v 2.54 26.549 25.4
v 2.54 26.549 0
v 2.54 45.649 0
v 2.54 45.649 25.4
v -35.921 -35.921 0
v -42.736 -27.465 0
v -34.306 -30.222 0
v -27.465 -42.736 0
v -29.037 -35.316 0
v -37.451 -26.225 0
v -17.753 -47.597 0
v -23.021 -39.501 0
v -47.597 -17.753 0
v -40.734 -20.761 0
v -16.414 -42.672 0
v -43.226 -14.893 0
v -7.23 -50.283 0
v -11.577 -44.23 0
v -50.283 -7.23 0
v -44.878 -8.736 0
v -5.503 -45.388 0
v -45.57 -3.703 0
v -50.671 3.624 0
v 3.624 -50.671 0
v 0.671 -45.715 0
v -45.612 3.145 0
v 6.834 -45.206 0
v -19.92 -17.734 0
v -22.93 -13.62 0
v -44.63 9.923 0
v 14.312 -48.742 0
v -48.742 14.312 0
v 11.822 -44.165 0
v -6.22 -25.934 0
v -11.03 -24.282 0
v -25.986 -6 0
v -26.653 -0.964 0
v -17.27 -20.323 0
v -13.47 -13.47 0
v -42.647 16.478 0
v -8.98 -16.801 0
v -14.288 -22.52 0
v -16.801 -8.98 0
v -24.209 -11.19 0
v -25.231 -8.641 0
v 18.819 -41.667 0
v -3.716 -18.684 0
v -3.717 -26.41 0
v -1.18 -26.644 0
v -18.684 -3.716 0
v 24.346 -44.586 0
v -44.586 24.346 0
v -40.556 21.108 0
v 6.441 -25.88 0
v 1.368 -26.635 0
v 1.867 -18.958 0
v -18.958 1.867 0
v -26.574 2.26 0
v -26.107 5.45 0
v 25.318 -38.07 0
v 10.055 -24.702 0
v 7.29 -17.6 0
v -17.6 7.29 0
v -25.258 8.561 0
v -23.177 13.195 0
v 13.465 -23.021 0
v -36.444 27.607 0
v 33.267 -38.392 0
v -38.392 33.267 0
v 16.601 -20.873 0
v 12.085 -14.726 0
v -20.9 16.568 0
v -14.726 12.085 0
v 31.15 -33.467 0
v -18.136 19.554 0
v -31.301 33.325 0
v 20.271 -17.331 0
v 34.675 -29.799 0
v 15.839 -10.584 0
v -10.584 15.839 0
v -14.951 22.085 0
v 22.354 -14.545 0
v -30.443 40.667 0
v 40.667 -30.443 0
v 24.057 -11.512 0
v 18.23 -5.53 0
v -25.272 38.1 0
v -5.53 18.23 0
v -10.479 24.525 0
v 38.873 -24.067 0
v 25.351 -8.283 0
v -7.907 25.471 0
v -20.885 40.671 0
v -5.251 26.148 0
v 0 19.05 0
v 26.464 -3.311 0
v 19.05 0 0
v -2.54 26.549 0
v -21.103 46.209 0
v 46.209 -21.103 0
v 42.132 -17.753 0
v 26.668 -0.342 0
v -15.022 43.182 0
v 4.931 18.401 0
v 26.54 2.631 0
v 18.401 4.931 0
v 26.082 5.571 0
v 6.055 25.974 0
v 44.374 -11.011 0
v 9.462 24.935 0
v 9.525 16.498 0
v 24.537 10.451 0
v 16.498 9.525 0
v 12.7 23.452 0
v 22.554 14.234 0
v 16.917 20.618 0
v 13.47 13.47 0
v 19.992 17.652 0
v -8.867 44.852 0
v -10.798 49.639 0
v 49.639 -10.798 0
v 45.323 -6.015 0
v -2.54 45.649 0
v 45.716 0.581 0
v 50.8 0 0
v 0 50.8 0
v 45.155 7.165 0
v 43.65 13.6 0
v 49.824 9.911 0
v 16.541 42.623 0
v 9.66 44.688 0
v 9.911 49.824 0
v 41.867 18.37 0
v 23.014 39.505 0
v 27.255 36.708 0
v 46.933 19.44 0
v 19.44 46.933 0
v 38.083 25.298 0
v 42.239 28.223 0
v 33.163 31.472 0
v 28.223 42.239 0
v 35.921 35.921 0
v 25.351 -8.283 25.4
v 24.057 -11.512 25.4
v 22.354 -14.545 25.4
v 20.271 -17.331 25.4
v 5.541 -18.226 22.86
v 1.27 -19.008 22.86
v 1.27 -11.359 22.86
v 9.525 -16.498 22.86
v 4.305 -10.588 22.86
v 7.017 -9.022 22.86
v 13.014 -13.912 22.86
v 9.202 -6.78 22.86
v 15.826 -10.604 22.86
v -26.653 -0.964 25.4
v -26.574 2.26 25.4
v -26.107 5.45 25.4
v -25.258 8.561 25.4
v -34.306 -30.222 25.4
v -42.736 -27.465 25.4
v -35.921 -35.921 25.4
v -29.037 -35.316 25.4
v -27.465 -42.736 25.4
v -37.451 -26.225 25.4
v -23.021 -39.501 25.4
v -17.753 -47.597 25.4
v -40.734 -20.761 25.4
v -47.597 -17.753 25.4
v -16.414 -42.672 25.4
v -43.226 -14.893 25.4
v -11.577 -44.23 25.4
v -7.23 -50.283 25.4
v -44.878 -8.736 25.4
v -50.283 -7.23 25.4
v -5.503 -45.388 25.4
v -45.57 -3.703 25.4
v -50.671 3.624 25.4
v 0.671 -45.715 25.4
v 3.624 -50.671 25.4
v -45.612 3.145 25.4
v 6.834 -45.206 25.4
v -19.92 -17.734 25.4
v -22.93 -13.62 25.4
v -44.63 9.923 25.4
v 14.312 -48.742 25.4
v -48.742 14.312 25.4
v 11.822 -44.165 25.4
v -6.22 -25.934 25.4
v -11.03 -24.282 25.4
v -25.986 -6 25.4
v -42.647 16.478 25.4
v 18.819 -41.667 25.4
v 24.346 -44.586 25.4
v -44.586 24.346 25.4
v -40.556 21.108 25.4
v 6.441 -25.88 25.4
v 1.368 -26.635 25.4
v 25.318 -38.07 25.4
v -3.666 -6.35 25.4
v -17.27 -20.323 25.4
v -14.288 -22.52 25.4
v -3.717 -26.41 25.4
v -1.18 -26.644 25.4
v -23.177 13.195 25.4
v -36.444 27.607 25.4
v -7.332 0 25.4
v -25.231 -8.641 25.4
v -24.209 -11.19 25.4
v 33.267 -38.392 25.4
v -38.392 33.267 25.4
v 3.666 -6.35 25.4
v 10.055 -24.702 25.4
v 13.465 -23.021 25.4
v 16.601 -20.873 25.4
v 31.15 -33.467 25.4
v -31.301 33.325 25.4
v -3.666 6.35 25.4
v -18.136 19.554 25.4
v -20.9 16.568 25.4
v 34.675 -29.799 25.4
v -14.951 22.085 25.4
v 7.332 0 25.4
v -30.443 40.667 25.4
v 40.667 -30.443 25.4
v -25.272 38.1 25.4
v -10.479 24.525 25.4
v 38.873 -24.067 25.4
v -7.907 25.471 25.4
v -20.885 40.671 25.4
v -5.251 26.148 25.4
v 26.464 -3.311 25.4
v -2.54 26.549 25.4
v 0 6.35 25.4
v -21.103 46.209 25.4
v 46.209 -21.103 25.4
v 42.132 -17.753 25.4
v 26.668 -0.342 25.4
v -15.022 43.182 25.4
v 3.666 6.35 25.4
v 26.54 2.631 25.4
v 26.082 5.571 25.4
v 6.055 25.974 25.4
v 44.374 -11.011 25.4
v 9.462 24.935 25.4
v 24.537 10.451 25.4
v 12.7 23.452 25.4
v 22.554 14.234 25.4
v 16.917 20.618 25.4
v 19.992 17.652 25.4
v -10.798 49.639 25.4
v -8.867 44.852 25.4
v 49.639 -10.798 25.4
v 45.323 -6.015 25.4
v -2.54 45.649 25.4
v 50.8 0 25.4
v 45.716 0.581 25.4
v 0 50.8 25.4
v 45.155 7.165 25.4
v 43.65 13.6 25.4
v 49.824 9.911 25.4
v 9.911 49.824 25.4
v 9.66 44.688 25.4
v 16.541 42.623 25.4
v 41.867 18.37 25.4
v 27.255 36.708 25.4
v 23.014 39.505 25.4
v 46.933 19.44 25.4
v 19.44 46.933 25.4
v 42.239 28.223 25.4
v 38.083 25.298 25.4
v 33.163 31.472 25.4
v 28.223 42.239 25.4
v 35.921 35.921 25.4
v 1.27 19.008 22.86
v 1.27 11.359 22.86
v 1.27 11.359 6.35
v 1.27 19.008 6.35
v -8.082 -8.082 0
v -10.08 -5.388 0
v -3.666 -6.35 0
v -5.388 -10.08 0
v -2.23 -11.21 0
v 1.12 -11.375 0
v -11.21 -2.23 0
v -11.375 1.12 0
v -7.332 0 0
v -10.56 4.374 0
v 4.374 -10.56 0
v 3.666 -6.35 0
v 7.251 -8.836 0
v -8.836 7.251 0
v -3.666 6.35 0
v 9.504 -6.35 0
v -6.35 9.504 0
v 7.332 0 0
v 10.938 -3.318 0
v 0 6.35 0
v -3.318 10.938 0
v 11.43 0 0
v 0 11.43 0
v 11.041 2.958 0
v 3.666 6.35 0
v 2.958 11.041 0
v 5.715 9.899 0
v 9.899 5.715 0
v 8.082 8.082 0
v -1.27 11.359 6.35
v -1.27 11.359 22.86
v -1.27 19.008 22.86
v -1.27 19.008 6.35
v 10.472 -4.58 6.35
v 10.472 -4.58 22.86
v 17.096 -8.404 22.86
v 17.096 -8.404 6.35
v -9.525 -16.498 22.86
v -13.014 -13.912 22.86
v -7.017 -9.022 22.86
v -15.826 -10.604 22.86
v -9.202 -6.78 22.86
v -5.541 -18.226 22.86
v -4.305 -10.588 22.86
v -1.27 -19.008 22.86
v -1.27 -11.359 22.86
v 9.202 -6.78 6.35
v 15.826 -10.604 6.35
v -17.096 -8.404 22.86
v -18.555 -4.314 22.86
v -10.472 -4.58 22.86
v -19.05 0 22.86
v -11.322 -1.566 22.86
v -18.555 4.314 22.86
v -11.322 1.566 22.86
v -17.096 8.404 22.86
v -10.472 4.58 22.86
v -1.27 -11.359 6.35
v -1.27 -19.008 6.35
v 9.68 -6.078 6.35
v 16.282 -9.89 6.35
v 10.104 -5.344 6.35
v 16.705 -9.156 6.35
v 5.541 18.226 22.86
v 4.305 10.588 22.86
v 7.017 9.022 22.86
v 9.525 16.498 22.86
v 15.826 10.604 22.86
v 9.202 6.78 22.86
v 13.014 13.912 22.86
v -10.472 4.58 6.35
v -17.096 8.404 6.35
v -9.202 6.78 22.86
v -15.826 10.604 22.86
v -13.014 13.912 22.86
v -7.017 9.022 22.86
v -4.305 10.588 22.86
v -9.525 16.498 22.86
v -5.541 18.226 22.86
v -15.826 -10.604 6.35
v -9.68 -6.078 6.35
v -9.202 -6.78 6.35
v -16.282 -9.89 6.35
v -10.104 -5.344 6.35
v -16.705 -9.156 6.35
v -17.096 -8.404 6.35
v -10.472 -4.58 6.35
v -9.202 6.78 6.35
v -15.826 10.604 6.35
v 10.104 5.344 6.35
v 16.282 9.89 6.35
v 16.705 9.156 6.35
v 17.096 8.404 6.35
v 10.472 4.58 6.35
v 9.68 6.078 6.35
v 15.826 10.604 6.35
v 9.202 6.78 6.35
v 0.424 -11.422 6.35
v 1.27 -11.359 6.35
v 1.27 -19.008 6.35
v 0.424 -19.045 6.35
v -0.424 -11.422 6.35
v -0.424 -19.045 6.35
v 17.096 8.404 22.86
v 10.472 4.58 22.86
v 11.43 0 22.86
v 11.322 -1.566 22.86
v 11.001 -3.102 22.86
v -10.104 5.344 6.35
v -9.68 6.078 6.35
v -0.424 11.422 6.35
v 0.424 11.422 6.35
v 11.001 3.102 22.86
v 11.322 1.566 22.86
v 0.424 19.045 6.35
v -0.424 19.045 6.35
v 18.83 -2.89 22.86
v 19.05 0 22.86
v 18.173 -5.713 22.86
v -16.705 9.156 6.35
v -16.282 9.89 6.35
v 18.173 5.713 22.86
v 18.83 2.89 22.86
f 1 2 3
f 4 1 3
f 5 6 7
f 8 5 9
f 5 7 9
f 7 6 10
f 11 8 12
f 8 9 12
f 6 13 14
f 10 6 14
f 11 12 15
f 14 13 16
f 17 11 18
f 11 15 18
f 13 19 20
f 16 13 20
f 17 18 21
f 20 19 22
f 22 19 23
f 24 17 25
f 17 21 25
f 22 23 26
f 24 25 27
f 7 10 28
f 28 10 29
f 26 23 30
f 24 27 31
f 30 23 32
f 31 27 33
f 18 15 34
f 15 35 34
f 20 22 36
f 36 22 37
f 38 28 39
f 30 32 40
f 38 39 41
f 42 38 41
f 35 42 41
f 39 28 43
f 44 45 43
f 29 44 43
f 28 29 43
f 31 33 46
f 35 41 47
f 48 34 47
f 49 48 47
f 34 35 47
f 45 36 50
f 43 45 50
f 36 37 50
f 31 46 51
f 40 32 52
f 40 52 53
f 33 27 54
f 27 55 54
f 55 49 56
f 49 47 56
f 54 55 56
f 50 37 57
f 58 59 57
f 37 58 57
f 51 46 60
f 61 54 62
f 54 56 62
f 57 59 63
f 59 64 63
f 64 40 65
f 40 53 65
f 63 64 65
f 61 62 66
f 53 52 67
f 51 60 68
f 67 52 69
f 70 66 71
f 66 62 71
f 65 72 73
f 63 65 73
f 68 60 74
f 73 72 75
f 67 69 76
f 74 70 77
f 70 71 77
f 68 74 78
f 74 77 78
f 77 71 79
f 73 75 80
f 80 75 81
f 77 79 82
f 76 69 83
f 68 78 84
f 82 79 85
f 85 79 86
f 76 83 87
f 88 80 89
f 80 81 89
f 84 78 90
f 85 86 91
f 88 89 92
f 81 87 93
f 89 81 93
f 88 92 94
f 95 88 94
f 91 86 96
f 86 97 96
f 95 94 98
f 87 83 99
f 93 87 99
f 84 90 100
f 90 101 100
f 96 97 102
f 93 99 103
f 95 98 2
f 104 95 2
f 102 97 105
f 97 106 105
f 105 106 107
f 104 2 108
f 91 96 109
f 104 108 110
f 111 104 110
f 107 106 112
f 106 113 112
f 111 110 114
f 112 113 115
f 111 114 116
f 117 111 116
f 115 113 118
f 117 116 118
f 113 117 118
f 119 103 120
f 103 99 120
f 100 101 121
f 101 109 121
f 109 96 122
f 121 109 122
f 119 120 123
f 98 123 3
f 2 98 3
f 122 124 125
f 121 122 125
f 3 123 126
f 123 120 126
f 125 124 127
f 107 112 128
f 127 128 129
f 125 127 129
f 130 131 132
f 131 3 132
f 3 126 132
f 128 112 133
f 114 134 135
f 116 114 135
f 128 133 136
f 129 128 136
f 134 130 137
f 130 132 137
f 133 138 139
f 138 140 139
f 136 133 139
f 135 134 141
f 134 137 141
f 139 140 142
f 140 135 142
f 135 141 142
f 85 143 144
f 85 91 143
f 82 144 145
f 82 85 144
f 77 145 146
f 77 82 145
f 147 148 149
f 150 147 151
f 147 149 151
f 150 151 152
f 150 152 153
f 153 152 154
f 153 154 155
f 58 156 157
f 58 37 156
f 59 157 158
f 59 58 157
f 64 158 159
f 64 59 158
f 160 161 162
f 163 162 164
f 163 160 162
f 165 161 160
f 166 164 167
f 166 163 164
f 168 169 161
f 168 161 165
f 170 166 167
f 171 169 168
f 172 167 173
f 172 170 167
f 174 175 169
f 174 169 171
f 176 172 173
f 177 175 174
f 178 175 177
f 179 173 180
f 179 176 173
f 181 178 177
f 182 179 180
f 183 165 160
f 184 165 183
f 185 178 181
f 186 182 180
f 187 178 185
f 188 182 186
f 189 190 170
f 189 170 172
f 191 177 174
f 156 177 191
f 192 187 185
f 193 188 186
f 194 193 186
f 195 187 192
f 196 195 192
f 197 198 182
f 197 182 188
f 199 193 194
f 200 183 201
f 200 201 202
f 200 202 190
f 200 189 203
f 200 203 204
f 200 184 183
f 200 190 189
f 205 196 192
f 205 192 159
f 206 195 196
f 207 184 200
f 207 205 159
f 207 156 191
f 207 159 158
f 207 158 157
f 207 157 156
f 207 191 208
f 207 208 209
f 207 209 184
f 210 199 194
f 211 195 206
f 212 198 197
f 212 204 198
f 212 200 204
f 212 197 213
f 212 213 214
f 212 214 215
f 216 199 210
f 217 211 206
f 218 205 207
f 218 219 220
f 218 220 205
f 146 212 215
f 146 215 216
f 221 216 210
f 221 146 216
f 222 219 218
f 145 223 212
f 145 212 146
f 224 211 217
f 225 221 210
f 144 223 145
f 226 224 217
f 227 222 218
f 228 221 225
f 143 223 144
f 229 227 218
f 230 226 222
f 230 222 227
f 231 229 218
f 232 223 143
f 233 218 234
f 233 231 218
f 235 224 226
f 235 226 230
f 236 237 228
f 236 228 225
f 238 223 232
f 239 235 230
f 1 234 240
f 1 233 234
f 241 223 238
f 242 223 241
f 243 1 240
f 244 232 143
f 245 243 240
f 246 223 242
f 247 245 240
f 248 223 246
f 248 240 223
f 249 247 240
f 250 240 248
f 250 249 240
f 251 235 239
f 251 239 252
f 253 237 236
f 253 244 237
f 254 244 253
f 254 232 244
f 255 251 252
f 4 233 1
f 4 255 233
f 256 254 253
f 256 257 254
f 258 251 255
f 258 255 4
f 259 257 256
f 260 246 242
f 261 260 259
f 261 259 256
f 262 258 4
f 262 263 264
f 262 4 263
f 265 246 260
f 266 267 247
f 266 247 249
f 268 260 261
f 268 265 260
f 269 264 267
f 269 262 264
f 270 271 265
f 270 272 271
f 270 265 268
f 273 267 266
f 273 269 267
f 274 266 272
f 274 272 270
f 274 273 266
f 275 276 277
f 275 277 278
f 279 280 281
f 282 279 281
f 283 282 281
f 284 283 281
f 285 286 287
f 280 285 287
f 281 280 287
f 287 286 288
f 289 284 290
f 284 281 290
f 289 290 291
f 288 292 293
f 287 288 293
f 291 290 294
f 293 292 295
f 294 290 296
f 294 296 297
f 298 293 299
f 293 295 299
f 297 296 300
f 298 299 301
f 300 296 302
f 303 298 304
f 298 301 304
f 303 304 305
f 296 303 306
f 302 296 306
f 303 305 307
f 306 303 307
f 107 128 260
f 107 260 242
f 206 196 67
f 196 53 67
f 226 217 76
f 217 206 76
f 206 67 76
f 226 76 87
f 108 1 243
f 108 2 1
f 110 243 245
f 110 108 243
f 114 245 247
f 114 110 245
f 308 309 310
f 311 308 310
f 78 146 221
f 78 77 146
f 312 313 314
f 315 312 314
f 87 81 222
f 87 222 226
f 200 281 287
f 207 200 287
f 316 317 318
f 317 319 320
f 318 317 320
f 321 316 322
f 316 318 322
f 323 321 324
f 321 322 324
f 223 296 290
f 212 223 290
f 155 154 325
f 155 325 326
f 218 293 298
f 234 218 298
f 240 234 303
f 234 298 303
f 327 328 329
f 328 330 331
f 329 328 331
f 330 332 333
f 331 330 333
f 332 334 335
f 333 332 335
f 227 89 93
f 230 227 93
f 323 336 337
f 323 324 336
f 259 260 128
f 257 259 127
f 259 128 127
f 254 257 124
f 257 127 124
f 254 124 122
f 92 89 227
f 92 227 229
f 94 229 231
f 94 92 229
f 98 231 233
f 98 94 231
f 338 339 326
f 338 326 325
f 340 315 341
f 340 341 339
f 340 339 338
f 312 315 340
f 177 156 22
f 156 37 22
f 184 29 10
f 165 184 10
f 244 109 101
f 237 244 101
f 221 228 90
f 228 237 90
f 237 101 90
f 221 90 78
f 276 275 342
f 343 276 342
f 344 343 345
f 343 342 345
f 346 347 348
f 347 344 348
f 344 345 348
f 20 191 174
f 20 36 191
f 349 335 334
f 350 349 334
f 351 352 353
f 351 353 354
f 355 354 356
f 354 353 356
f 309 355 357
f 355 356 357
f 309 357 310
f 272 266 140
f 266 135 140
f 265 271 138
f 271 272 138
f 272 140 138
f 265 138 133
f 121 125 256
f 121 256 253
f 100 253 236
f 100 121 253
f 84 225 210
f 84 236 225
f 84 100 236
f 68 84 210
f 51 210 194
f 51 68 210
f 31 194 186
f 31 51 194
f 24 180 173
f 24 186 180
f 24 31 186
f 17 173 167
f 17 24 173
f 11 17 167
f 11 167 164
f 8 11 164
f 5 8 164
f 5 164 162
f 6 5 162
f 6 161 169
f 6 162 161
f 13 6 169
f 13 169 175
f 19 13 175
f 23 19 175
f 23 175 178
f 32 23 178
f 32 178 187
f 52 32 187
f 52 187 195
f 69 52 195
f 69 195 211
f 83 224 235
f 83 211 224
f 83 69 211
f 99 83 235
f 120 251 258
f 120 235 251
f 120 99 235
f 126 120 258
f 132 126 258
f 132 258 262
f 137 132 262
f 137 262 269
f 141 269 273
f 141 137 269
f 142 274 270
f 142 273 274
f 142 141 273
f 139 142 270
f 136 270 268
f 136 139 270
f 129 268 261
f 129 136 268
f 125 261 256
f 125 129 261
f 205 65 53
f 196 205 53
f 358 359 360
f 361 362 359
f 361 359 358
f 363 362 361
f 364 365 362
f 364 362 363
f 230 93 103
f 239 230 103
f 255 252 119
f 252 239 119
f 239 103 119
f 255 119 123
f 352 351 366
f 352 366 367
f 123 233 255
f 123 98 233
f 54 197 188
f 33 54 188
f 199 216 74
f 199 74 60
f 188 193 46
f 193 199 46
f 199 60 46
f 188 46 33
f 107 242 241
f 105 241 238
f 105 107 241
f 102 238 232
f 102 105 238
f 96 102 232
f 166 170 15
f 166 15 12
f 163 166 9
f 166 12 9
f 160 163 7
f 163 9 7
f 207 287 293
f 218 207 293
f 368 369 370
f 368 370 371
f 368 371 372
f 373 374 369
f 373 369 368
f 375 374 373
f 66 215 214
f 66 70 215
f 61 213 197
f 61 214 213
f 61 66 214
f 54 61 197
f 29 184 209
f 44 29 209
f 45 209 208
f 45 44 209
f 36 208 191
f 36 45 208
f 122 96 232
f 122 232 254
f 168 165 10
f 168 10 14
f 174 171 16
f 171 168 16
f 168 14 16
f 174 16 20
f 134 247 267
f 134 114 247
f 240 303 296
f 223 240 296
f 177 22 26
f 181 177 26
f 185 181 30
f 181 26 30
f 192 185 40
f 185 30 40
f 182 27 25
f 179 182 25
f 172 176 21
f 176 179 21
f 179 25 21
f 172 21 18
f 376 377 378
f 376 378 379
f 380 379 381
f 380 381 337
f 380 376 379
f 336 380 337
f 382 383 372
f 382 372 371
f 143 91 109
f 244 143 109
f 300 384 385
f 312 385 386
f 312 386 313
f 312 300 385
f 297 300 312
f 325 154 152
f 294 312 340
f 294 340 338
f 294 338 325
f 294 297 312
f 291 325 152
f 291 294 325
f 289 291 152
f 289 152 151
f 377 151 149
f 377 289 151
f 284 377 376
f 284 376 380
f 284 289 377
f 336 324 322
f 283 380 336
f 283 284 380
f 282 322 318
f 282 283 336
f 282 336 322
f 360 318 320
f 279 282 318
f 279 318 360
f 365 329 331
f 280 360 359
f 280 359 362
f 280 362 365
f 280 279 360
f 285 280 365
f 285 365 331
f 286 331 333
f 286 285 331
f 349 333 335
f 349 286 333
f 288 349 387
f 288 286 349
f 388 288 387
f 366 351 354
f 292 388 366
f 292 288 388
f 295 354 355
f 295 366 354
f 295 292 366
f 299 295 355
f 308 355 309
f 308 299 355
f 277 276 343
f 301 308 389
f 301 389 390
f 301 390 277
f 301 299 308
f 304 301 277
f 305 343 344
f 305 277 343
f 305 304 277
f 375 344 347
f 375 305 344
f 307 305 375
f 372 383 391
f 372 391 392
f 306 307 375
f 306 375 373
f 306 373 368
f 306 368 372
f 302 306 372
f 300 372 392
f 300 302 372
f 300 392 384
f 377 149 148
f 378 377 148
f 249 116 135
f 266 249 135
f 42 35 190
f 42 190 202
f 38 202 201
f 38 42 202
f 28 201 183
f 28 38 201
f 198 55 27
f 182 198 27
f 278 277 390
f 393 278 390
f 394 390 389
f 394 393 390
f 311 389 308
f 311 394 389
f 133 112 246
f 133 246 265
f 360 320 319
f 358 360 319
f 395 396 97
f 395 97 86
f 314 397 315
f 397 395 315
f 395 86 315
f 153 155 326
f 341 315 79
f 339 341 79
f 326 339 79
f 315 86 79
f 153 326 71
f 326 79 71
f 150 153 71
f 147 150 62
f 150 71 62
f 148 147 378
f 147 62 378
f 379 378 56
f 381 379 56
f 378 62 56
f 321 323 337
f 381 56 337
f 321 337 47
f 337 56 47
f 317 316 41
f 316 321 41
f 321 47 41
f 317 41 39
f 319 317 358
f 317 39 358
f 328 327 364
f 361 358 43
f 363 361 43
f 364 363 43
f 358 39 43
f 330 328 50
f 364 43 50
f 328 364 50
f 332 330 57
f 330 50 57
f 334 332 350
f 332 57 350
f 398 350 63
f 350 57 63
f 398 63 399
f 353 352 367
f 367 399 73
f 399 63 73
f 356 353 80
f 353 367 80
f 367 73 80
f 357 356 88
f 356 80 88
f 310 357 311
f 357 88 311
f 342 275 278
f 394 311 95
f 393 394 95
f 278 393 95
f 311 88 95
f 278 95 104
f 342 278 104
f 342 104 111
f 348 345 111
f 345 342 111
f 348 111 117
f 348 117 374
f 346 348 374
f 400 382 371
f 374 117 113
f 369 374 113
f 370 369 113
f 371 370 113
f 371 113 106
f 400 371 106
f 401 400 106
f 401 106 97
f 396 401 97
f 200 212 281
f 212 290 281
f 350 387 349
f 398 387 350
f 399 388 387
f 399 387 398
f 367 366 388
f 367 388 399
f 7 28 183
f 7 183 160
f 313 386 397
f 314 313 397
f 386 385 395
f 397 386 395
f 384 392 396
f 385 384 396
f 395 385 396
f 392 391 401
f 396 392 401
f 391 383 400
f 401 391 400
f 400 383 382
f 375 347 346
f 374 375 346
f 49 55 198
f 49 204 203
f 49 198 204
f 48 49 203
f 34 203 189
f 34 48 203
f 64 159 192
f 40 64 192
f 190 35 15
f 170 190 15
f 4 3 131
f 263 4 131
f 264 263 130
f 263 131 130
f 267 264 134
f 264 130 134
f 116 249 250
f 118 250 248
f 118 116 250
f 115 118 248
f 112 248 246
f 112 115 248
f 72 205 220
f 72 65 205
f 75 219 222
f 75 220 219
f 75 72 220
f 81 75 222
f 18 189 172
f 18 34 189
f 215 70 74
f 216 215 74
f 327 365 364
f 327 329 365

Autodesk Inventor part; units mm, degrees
ref_plane "YZ Plane" through (0, 0, 0) normal (1, 0, 0) x (0, 1, 0)
ref_plane "XZ Plane" through (0, 0, 0) normal (0, 1, 0) x (-1, 0, 0)
ref_plane "XY Plane" through (0, 0, 0) normal (0, 0, 1) x (1, 0, 0)
sketch "Sketch1" plane through (0, 0, 0) normal (0, 0, 1) x (1, 0, 0)
  circle A0 centre (0, 0) radius 50.8
  circle A1 centre (0, 0) radius 45.72
  circle A2 centre (0, 0) radius 26.67
  circle A3 centre (0, 0) radius 19.05
  circle A4 centre (0, 0) radius 11.43
  line L0 (3.6662, 6.35) -> (7.3323, 0)
  line L1 (7.3323, 0) -> (3.6662, -6.35)
  line L2 (3.6662, -6.35) -> (-3.6662, -6.35)
  line L3 (-3.6662, -6.35) -> (-7.3323, 0)
  line L4 (-7.3323, 0) -> (-3.6662, 6.35)
  line L5 (-3.6662, 6.35) -> (3.6662, 6.35)
  line L6 (0, 0) -> (0, 58.0354)
  line L7 (-2.54, 26.5488) -> (-2.54, 45.6494)
  line L8 (2.54, 26.5488) -> (2.54, 45.6494)
  line L9 (12.7, 23.4521) -> (23.014, 39.5054)
  line L10 (16.9172, 20.6179) -> (27.2549, 36.7081)
  line L11 (24.5372, 10.4506) -> (41.8671, 18.3702)
  line L12 (43.6505, 13.5998) -> (26.0816, 5.571)
  line L13 (26.4637, -3.3108) -> (45.3226, -6.0149)
  line L14 (25.3511, -8.2832) -> (44.3743, -11.0109)
  line L15 (20.2711, -17.3312) -> (34.6746, -29.7992)
  line L16 (16.6011, -20.8733) -> (31.1496, -33.4667)
  line L17 (6.4411, -25.8805) -> (11.8225, -44.165)
  line L18 (1.3677, -26.6349) -> (6.8336, -45.2064)
  line L19 (-6.2201, -25.9345) -> (-11.577, -44.23)
  line L20 (-11.0296, -24.2824) -> (-16.4141, -42.672)
  line L21 (-19.9196, -17.7341) -> (-34.3062, -30.2225)
  line L22 (-22.9299, -13.6202) -> (-37.4507, -26.2252)
  line L23 (-25.9863, -6.0002) -> (-44.8776, -8.7359)
  line L24 (-26.6526, -0.9637) -> (-45.5698, -3.7032)
  line L25 (-25.2585, 8.5613) -> (-42.6471, 16.4785)
  line L26 (-23.177, 13.1954) -> (-40.5558, 21.108)
  line L27 (-14.9508, 22.0854) -> (-25.2719, 38.1005)
  line L28 (-10.4794, 24.5249) -> (-20.8849, 40.6711)
  dimension "d2" = 19.05
  dimension "d0" = 101.6
  dimension "d1" = 5.08
  dimension "d3" = 7.62
  dimension "d4" = 22.86
  dimension "d5" = 12.7
  dimension "d6" = 5.08
  dimension "d7" = 2.54
  dimension "d8" = 5.08
  dimension "d9" = 32.72
  dimension "d10" = 10.16
  dimension "d11" = 32.72
  dimension "d12" = 5.08
  dimension "d13" = 7.62
  dimension "d14" = 5.08
  dimension "d15" = 32.72
  dimension "d16" = 8.89
  dimension "d17" = 32.72
  dimension "d18" = 5.08
  dimension "d19" = 5.08
  dimension "d20" = 32.72
  dimension "d21" = 10.16
  dimension "d22" = 5.08
  dimension "d23" = 5.08
  dimension "d24" = 32.72
  dimension "d25" = 7.62
  dimension "d26" = 5.08
  dimension "d27" = 32.72
  dimension "d28" = 8.89
  dimension "d29" = 5.08
  dimension "d30" = 32.72
  dimension "d31" = 7.62
  dimension "d32" = 5.08
  dimension "d33" = 32.72
  dimension "d34" = 9.525
  dimension "d35" = 5.08
  dimension "d36" = 32.72
  dimension "d37" = 8.89
extrude "Extrusion3" add sketch "Sketch1" along normal blind 25.4 contours A1 L8 A2 L6 | L6 A2 L7 A1 | A0 | A2 | A4 | A1 L10 A2 L9 | L28 A2 L27 A1 | A1 L12 A2 L11 | L26 A2 L25 A1 | L24 A2 L23 A1 | A1 L14 A2 L13 | L22 A2 L21 A1 | A1 L16 A2 L15 | L20 A2 L19 A1 | A1 L18 A2 L17
sketch "Sketch3" plane through (0, 0, 25.4) normal (0, 0, 1) x (1, 0, 0)
  circle A0 centre (0, 0) radius 11.43 projected
  circle A1 centre (0, 0) radius 19.05 projected
extrude "Extrusion4" add sketch "Sketch3" against normal blind 2.54
sketch "Sketch4" plane through (0, 0, 22.86) normal (0, 0, -1) x (-1, 0, 0)
  circle A0 centre (0, 0) radius 11.43 projected
  line L0 (-10.4724, 4.5798) -> (-17.0961, 8.404)
  circle A1 centre (0, 0) radius 19.05 projected
  line L1 (-9.2024, 6.7795) -> (-15.8261, 10.6037)
  line L2 (-7.3323, 0) -> (-3.6662, 6.35) projected
  line L3 (-3.6662, 6.35) -> (-7.3323, 0) projected
  line L4 (-3.6662, 6.35) -> (-14.3563, 12.5219)
  line L5 (3.6662, 6.35) -> (-3.6662, 6.35) projected
  line L6 (-3.6662, 6.35) -> (3.6662, 6.35) projected
  line L7 (-1.27, -11.3592) -> (-1.27, -19.0076)
  line L8 (1.27, -11.3592) -> (1.27, -19.0076)
  line L9 (-3.6662, -6.35) -> (3.6662, -6.35) projected
  line L10 (-3.6662, -6.35) -> (-14.3563, -12.5219)
  line L11 (3.6662, -6.35) -> (14.3563, -12.5219)
  line L12 (3.6662, 6.35) -> (14.3563, 12.5219)
  line L13 (-3.6662, -6.35) -> (-7.3323, 0) projected
  line L14 (3.6662, 6.35) -> (7.3323, 0) projected
  line L15 (7.3323, 0) -> (3.6662, -6.35) projected
  line L16 (10.4724, -4.5798) -> (17.0961, -8.404)
  line L17 (9.2024, -6.7795) -> (15.8261, -10.6037)
  line L18 (-10.4724, -4.5798) -> (-17.0961, -8.404)
  line L19 (-9.2024, -6.7795) -> (-15.8261, -10.6037)
  line L20 (9.2024, 6.7795) -> (15.8261, 10.6037)
  line L21 (10.4724, 4.5798) -> (17.0961, 8.404)
  line L22 (-3.6662, 6.35) -> (-3.6662, 18.6939)
  line L23 (3.6662, -6.35) -> (3.6662, -18.6939)
  line L24 (3.6662, -6.35) -> (-3.6662, -6.35) projected
  line L25 (-1.27, 11.3592) -> (-1.27, 19.0076)
  line L26 (1.27, 11.3592) -> (1.27, 19.0076)
  dimension "d57" = 2.54
  dimension "d62" = 2.54
  dimension "d64" = 2.54
  dimension "d66" = 2.54
  dimension "d68" = 2.54
  dimension "d72" = 2.3962
  dimension "d73" = 2.3962
  dimension "d74" = 2.3962
  dimension "d75" = 2.3962
  dimension "d76" = 2.3962
  dimension "d77" = 2.3962
  dimension "d78" = 2.54
extrude "Extrusion5" add sketch "Sketch4" along normal blind 16.51 contours A0 L20 A1 L21 | L16 A1 L17 A0 | A0 L25 A1 L26 | L8 A1 L7 A0 | A0 L0 A1 L1 | L19 A1 L18 A0
equation "\"d11\" = d9"
equation "\"d15\" = d11"
equation "\"d17\" = d9"
equation "\"d20\" = d9"
equation "\"d24\" = d9"
equation "\"d27\" = d9"
equation "\"d30\" = d9"
equation "\"d33\" = d9"
equation "\"d36\" = d9"
properties part number "RobotArm Wheel"
